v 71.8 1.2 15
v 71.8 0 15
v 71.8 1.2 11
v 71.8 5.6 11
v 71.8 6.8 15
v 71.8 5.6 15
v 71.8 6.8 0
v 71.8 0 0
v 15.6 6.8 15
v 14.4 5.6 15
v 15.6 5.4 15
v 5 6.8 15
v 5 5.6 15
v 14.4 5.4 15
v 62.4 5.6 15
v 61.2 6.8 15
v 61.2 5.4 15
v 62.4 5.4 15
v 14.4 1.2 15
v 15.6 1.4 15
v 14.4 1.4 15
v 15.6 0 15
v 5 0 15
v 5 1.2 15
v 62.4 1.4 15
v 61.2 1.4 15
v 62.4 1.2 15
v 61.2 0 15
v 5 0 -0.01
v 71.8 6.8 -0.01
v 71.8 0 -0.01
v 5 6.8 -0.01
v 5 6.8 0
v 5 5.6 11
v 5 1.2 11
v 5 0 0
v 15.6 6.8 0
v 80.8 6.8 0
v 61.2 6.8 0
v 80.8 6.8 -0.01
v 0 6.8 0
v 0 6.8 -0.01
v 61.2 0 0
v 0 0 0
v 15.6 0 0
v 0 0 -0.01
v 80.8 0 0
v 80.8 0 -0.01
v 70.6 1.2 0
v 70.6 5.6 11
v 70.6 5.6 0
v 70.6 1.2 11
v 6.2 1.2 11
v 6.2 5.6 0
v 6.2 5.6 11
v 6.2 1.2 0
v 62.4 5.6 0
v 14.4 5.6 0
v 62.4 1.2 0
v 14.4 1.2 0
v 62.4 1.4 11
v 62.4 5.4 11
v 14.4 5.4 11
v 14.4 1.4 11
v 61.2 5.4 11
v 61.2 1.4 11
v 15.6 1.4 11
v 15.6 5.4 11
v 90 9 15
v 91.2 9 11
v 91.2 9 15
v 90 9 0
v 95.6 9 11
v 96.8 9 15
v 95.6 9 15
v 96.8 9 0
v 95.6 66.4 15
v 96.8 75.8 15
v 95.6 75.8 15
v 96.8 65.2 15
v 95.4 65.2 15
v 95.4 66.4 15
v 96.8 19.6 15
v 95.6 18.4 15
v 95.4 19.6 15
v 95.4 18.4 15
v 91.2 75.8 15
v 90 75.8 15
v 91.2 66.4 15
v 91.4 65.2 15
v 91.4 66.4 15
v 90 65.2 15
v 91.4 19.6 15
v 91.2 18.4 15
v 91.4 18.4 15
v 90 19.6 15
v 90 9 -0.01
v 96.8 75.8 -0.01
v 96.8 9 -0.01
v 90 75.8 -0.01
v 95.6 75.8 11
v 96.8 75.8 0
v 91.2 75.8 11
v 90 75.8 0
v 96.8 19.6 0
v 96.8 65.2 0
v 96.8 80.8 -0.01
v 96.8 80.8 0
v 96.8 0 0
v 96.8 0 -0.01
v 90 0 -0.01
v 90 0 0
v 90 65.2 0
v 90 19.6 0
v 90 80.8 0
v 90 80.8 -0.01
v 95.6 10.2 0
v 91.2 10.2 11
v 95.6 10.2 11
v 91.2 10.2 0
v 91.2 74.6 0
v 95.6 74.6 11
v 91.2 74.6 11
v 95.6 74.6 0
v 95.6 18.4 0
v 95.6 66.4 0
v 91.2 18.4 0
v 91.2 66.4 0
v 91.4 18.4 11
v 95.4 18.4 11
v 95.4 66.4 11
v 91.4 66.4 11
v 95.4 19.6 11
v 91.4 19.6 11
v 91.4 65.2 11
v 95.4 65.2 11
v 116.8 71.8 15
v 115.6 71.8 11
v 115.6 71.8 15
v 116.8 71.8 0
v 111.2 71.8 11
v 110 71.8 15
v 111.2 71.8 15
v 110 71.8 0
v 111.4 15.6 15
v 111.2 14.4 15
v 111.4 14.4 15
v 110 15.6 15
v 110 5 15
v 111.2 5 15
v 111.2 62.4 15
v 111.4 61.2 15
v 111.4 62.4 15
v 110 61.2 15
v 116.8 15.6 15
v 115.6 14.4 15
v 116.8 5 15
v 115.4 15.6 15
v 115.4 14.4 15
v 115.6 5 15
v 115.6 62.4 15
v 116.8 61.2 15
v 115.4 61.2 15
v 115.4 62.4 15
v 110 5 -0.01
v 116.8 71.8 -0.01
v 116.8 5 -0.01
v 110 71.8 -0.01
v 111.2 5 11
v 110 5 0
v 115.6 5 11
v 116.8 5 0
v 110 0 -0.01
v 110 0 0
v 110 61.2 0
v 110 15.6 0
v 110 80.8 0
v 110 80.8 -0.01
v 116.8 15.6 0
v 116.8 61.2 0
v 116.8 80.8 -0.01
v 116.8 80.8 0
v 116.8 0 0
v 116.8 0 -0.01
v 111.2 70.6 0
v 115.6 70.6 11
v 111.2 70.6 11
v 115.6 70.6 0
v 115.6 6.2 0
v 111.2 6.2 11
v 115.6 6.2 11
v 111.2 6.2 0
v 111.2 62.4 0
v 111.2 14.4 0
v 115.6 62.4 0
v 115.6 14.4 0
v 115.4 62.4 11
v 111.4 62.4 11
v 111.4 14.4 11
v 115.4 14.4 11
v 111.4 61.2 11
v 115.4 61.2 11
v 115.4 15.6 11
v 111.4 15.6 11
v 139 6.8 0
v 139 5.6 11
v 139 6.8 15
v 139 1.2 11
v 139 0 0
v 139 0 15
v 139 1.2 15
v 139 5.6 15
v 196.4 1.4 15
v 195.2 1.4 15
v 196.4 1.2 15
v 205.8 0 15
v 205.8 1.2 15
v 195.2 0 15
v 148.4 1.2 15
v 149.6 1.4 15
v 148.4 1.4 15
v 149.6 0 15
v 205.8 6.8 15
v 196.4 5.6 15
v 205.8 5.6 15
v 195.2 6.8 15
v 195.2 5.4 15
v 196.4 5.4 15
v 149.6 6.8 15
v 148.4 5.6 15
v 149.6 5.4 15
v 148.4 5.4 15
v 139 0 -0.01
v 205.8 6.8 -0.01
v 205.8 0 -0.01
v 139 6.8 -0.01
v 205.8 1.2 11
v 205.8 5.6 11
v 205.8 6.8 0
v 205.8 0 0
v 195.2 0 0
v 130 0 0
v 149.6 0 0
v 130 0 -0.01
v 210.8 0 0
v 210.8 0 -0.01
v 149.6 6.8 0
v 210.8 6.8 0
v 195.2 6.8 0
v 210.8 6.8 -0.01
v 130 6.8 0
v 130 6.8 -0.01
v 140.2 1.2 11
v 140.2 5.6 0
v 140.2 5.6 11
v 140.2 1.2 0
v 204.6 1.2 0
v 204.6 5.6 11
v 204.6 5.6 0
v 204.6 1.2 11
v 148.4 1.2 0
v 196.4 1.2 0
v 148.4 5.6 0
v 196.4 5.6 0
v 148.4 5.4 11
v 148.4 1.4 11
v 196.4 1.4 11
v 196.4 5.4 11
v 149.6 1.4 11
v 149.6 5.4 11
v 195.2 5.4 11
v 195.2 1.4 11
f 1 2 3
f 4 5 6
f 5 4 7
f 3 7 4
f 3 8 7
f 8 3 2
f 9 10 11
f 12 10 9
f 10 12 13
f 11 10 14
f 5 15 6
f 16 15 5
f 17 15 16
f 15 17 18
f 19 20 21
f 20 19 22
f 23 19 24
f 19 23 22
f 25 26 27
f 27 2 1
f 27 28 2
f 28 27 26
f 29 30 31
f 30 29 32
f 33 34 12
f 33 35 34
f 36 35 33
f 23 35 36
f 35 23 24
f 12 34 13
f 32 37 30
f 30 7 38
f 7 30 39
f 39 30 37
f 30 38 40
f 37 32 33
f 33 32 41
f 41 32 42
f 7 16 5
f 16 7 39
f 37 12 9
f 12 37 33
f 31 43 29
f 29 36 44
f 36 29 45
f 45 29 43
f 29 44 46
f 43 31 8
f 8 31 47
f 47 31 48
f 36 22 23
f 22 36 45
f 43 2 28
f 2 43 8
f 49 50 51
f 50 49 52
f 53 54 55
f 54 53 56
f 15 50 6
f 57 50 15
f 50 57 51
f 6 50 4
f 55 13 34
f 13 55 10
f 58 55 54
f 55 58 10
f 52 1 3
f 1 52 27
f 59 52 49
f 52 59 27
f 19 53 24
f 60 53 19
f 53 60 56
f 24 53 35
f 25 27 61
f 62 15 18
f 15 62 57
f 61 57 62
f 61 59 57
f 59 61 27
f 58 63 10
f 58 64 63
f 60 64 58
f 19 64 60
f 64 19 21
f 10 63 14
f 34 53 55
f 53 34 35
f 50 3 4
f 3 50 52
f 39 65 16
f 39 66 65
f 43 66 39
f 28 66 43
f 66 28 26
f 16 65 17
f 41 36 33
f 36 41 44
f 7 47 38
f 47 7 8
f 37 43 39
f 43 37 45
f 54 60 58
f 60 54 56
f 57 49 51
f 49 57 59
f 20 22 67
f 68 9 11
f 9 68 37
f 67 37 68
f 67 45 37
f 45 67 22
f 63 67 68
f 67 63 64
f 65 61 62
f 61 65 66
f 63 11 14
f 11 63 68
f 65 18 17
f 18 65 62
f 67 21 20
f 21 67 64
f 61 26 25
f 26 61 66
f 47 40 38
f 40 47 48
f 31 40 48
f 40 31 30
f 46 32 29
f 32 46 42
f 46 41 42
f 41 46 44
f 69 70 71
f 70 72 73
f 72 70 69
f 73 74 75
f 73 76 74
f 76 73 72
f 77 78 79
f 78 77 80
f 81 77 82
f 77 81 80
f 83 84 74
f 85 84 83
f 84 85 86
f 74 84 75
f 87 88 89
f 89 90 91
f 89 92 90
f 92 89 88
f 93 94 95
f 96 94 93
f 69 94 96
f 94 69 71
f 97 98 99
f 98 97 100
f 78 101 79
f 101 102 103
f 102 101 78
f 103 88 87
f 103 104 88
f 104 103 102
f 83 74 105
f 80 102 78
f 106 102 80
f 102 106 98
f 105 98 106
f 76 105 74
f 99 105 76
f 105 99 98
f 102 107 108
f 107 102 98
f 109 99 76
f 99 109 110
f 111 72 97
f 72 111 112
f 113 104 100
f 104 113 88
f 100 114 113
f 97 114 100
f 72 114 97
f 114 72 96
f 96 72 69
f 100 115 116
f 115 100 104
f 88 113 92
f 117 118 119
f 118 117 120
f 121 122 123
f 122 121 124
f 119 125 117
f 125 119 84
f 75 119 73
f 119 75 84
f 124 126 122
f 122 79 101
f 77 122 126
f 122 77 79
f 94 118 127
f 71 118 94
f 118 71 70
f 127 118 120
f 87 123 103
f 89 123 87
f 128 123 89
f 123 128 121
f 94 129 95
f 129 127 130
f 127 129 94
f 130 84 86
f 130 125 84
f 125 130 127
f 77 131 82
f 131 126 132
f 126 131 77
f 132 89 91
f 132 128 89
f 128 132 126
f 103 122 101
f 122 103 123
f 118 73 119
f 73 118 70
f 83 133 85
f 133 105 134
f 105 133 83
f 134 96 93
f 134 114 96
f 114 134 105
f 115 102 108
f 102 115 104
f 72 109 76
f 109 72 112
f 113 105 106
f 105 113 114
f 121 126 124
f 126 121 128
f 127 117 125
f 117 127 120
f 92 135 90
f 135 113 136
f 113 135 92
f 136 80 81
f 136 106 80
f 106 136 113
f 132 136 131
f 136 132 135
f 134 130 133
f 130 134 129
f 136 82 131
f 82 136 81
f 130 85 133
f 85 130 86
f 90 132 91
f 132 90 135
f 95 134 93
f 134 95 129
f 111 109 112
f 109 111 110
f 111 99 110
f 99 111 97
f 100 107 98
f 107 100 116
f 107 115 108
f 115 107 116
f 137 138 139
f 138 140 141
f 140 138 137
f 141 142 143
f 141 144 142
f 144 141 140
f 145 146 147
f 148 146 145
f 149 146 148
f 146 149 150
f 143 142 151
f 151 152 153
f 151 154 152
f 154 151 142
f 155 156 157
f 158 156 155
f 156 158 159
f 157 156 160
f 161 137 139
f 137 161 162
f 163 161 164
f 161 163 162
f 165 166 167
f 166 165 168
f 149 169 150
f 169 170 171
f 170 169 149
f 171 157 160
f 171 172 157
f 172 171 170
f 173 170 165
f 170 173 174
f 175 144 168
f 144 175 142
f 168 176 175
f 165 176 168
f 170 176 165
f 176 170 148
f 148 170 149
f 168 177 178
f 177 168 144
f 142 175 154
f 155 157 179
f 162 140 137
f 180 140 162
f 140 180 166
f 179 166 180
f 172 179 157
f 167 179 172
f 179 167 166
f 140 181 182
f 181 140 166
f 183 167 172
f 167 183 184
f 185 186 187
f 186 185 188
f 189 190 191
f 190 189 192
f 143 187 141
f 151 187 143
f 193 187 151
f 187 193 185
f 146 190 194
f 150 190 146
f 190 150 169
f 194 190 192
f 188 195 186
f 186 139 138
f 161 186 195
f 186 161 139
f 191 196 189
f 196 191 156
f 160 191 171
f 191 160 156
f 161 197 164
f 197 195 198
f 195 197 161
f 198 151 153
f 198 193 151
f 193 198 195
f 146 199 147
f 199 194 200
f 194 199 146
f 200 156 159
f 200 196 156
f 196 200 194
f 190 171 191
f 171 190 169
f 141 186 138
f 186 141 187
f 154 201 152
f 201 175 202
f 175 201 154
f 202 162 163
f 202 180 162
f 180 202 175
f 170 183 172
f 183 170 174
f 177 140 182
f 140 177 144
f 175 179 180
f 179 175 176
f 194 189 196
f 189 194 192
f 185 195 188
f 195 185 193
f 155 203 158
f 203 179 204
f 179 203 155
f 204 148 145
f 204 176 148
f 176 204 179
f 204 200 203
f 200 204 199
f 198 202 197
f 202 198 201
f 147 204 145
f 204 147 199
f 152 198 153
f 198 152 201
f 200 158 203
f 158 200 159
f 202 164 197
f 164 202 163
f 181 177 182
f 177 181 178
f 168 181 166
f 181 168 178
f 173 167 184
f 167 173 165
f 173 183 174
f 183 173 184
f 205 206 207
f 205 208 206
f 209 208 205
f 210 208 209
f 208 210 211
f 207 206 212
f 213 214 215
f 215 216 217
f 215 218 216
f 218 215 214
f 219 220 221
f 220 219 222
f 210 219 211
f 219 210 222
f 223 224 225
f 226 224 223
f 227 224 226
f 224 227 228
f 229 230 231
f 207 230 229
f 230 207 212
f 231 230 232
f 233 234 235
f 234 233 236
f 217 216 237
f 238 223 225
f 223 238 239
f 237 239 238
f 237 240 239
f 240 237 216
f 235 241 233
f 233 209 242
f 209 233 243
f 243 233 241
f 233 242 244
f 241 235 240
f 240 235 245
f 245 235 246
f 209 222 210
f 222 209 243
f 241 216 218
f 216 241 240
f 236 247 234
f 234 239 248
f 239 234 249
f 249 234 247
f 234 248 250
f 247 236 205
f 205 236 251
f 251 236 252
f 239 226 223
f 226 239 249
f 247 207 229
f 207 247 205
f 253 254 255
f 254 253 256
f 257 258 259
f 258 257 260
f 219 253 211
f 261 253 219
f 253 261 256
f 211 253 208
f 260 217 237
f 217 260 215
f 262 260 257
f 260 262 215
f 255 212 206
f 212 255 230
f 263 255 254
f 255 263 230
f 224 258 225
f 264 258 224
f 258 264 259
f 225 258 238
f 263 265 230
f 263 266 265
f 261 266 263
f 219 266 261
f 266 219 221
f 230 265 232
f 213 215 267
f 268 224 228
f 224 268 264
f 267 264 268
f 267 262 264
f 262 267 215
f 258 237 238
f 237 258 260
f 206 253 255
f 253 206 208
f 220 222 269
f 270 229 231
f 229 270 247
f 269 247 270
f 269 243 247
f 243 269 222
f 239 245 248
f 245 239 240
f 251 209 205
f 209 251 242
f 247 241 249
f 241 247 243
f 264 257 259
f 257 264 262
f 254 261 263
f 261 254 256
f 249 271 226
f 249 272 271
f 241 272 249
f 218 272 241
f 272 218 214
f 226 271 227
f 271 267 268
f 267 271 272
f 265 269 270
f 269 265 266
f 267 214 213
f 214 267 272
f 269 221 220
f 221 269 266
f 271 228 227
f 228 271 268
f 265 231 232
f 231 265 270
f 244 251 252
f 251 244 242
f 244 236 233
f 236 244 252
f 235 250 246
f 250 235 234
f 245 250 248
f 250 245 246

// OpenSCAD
// file: ../../Base/Boxes.scad
// Fischertechnik Box Foundation
// Pre-designed Boxes

use <Constants.scad>

include <PlacementOptions.scad>

box190Width = 190;
box190Depth = 130;
box130Width = 130;
box130Depth = 95;
boxUsageHeight = 33.9;
boxWallThickness = 2.4;
boxBaseThickness = 1.0;
boxWebWidth = 3.0;

// getBoxWallThickness()
// Gets the wall thickness of a Fischertechnik Box

function getBoxWallThickness() = boxWallThickness;

// Gets the usable height of a fischertechnik box
function getBoxUsageHeight() = boxUsageHeight;

// Gets the thickness of the Fischertechnik box base.
function getBoxBaseThickness() = boxBaseThickness;

// Gets the width of a box web
function getBoxWebWidth() = boxWebWidth;

// Gets the usable inner space of a Box 190 as an x/y-list
function getBox190Space() = [
    box190Width - 2*getBoxWallThickness(), 
    box190Depth - 2*getBoxWallThickness() ];

// Imports the Fischertechnik empty box 130x190 mm and places it at position 0,0
// 190x130 are the outer sizes, the inner space is slightly smaller. Use getBox190Space() to get the inner sizes.
// This module needs the STL file "Fischertechnik Box 130x190.stl" in the library path.
// The box is positioned that the usable inner space is at the 0,0,0 position. The

module Box190() {
    translate([-getBoxWallThickness(),-getBoxWallThickness(),-getBoxBaseThickness()])
        import("Fischertechnik Box 130x190.stl", convexity=3);
}

// Gets the usable inner space of a Box 130 as an x/y-list
function getBox130Space() = [
    box130Width - 2*getBoxWallThickness(), 
    box130Depth - 2*getBoxWallThickness() ];

// Imports the Fischertechnik empty box 95x130 mm and places it at position 0,0
// 190x130 are the outer sizes, the inner space is slightly smaller. Use getBox190Space() to get the inner sizes.
// This module needs the STL file "Fischertechnik Box 95x130.stl" in the library path.
// The box is positioned that the usable inner space is at the 0,0,0 position. The

module Box130() {
    translate([-getBoxWallThickness(),-getBoxWallThickness(),-getBoxBaseThickness()])
        import("Fischertechnik Box 95x130.stl", convexity=3);
}

// Creates a web at the specified box walls
// corner 0 = LowerLeft, 1 = UpperLeft, 2 = UpperRight, 3 = LowerRight
// side 0 = LeftOfCorner, 1 = RightOfCorner
// distance = Distance in mm from the corner
// box = inner width and depth of the box (default: Box 190)
// webWidth = length of the web (default is 3 mms)
// webThickness = thickness of the web (default is 1 mm)

module BoxWeb(corner, side, distance, box=getBox190Space(), webWidth=getBoxWebWidth(), webThickness=1.0) {
    sink = getBoxWallThickness()/2;

    width = (corner % 2 == 0) ? 
            (side == LeftOfCorner ? webWidth : webThickness) :
            (side == LeftOfCorner ? webThickness : webWidth);

    depth = (corner % 2 == 0) ? 
            (side == RightOfCorner ? webWidth : webThickness) :
            (side == RightOfCorner ? webThickness : webWidth);
    
    xDiff = corner == LowerLeft ? 
                (side == LeftOfCorner ? -sink : distance) :
            (corner == UpperLeft ?                
                (side == LeftOfCorner ? distance : -sink) :
            (corner == UpperRight ?
                (side == LeftOfCorner ? box.x-webWidth+sink : box.x-distance-webThickness) :
                (side == LeftOfCorner ? box.x-distance-webThickness: box.x-webWidth+sink)));

    yDiff = corner == LowerLeft ? 
                (side == RightOfCorner ? -sink : distance) :
            (corner == UpperLeft ?
                (side == RightOfCorner ? box.y-distance : box.y-webWidth+sink) :
            (corner == UpperRight ?
                (side == RightOfCorner ? box.y-webWidth+sink : box.y-distance) :
                (side == RightOfCorner ? distance : -sink)));
    
    translate([xDiff, yDiff, -getExcess()])
        cube([width, depth, boxUsageHeight + 2*getExcess()]);
}
// file: ../../Base/Rotation.scad
// Fischertechnik Box Foundation
// Geometry Helpers Rotation

include <PlacementOptions.scad>

// getRotatedSpace(space, rotation=NoRotation)
// Rotates the space dependent on the specified rotation

function getRotatedSpace(space, rotation=NoRotation) = [
    (rotation == Rotate90 || rotation == Rotate270) ? space.y : space.x,
    (rotation == Rotate90 || rotation == Rotate270) ? space.x : space.y
];

// Rotates the given space around the fixed left lower corner
// space = the space the children needs as width/depth list [width,depth]
// rotation = 0 Rotate0 degrees, 1 Rotate90 degrees, 2 Rotate180 degrees, 3 Rotate270 degrees (equivalent to -90)

module RotateFix(space, rotation=NoRotation) {
    dy = (rotation == Rotate0 || rotation == Rotate270) ? 0 :
        (rotation == Rotate90) ? space.x :
        space.y;
    dx = (rotation < Rotate180) ? 0 :
        (rotation == Rotate180) ? space.x :
        space.y;
    
    translate([dx, dy, 0])
        rotate([0, 0, rotations[rotation]])
            children();
}
// file: ../../Base/Alignment.scad
// Fischertechnik Box Foundation
// Geometry Helpers Alignment

include <PlacementOptions.scad>

// getAlignedX(elementWidth, spaceWidth, align=AlignRight, offset=0)
// Gets the aligned X offset of an element with the given
// width in the given space.
// elementWidth = The width of the element to positon
// spaceWidth = The space where the element should be aligned
// align = 0 AlignLeft, 1 AlignCenter, 2 AlignRight
// offset = an optional offset from the aligned position. When
// aligned left or centered, then positive values are in X direction.
// When aligned right then positive values are in negative X direction.

function getAlignedX(elementWidth, spaceWidth, align=AlignRight, offset=0) =
    (align == AlignLeft) ?
        offset :
        ((align == AlignCenter) ?
        (spaceWidth - elementWidth)/2 + offset :
        spaceWidth - offset - elementWidth);

// getAlignedY(elementDepth, spaceDepth, align=AlignTop, offset=0)
// Gets the aligned Y offset of an element with the given
// depth in the given space.
// elementDepth = The depth of the element to positon
// spaceDepth = The space where the element should be aligned
// align = 0 AlignBottom, 1 AlignCenter, 2 AlignTop
// offset = an optional offset from the aligned position. When
// aligned bottom or centered, then positive values are in Y direction.
// When aligned top then positive values are in negative Y direction.

function getAlignedY(elementDepth, spaceDepth, align=AlignTop, offset=0) =
    (align == AlignBottom) ?
        offset :
        ((align == AlignCenter) ?
        (spaceDepth - elementDepth)/2 + offset :
        spaceDepth - offset - elementDepth);
// file: ../../Base/Constants.scad
// Fischertechnik Box Foundation
// Constants

// Constant values necessary for multiple elements

// Base constants
dividerThickness = 1.2;
excess = 0.01;
fragments = 90;
tolerance = 0.8;

// Gets the thickness of a divider 
function getDividerThickness() = dividerThickness;

// Gets the excess that is used to merge walls into each other
function getExcess() = excess;

// Gets amount of fragments of a cylinder
function getFragments() = fragments;

// Gets the inner tolerance of a frame to each side
function getTolerance() = tolerance;


// Fischertechnik specific constants
axisDiameter = 4;
axisBottomDiameter = axisDiameter + 1;
axisTolerance = 0.2;
axisLockingLength = 8;

// Gets axis diameter of Fischertechnik axis
function getAxisDiameter() = axisDiameter;

// Gets axis diameter tolerance (subtracted for element axis)
function getAxisTolerance() = axisTolerance;

// Gets the axis diameter for standing axis
function getStandAxisDiameter() = getAxisDiameter() - getAxisTolerance();

// Gets axis bottom diameter for thicker part at the bottom
function getAxisBottomDiameter() = axisBottomDiameter;

// Gets the lengthh of the locking part of a locking axis
function getAxisLockingLength() = axisLockingLength;

// Studs

studHeight = 2.5;
studTolerance = 0.2;
studRailDistance = 9;   // as in ft 50

// gets the height of a connecting stud
function getStudHeight() = studHeight;

// gets the connecting stud height tolerance
function getStudTolerance() = studTolerance;

// gets the default rail distance for studs
function getStudRailDistance() = studRailDistance;

// Dockable Frame with Edge

standardEdgeDistance = 2.5;
standardWebDistance = 11.5;
standardCornerLength = 15;

// gets the standard distance to the wall of the box for dockable frames with webs
function getStandardEdgeDistance() = standardEdgeDistance;

// gets the standard distance of each web to the corner of the dockable frame
function getStandardWebDistance() = standardWebDistance;

// gets the standard length of the corner walls of a dockable frame
function getStandardCornerLength() = standardCornerLength;

// Tubes

tubeWallFactor = 0.8;

// gets the wall thickness of a tube.
function getTubeWallThickness() = tubeWallFactor * getDividerThickness();

// Small Parts and Divider Frame

smallPartsFrameHeight = 20;

// gets the frame height for docked small parts boxes.
function getSmallPartsFrameHeight() = smallPartsFrameHeight;

// Hubs

hubRingDiameter = 19.5;
hubRingLevelDiameter = 21;

// gets the diameter of a tube matching the inner ring of a wheel
function getHubRingDiameter() = hubRingDiameter;

// gets the diameter of a hub tube with a thicker diameter
function getHubRingLevelDiameter() = hubRingLevelDiameter;

// Struts

strutAddLength = 9.0;
strutDepth = 8.0;
strutThickness = 2.8;
strutOuterTolerance = 0.6;

// gets the full length of a strut (nominal length plus 2x radius at the ends)
function getFullStrutLength(length) = length + strutAddLength;

// gets the radius of the end of a strut
function getStrutEndRadius() = strutAddLength / 2;

// gets the the depth (width) of a strut
function getStrutDepth() = strutDepth;

// gets the the thickness of a strut
function getStrutThickness() = strutThickness;

// gets the tolerance added to the strut sizes for strut holders
function getStrutOuterTolerance() = strutOuterTolerance;

// Propeller

propellerAxisDiameter = 7.0;
propellerAxisTolerance = 0.2;

// gets the propeller axis outer diameter
function getPropellerAxisDiameter() = propellerAxisDiameter;

// gets the propeller axis printing tolerance
function getPropellerAxisTolerance() = propellerAxisTolerance;
// file: ../../Base/PlacementOptions.scad
// Fischertechnik Box Foundation
// Placement Options

// Alignment
NoAlign = 0;
AlignLeft = 1;
AlignBottom = 2;
AlignCenter = 3;
AlignRight = 4;
AlignTop = 5;

// Element rotation degree steps
rotations = [0, -90, -180, -270];

// Rotation
NoRotation = 0;
Rotate0 = 0;
Rotate90 = 1;
Rotate180 = 2;
Rotate270 = 3;

// Docking (seen from above)
NoDock = -1;
DockLeft = 0;
DockTop = 1;
DockRight = 2;
DockCorner = 2;
DockBottom = 3;

// Web corners
LowerLeft = 0;
UpperLeft = 1;
UpperRight = 2;
LowerRight = 3;

// Web position relative to corner
LeftOfCorner = 0;
RightOfCorner = 1;
// file: ../../Elements/FrameBracketWithAxle80.scad
// Fischertechnik Box Library
// Frame for bracket with axle 80
// 38201

use <../Base/Constants.scad>
use <../ModelBase/Simple.scad>
use <../ModelBase/Complex.scad>

length = 66;
axisLength = 80;

completeSpace = [
    axisLength + getTolerance(), 
    getFrameAxisSpace(length).y,
    getFrameAxisHeight()];

// getFrameBracketWithAxle80Space()
// Gets the width (.x) and depth (.y) of the axis frame.

function getFrameBracketWithAxle80Space() = completeSpace;

// FrameBracketWithAxle80()
// Axis holder for a single 60 mm axis.

module FrameBracketWithAxle80() {
    Space(completeSpace);
    translate([5, 0])
        FrameAxis(length, true);
}

// Test
color("lightgray")
FrameBracketWithAxle80();
// file: ../../Base/Placement.scad
// Fischertechnik Box Foundation
// Geometry Helpers Placement

use <Constants.scad>
use <Alignment.scad>
use <Rotation.scad>
use <Boxes.scad>

include <PlacementOptions.scad>

// Place(x=0, y=0, elementSpace=[0,0], alignX=AlignLeft, alignY=AlignBottom, rotation=Rotate0, boxSpace=getBox190Space())
// Places the child at the specified position
// y = Y-Position. This is a relative position when an X aligment is specified.
// x = X-Position. This is a relative position when an Y aligment is specified.
// elementSpace = space of the element to be placed [x,y]
// alignX = -1=NoAlign, 0 AlignLeft, 1 AlignCenter, 3 AlignRight (elementSpace and boxSpace required!)
// alignY = -1=NoAlign, 2 AlignBottom, 1 AlignCenter, 4 AlignTop (elementSpace and boxSpace required!)
// rotation = 0 Rotate0 0 degrees, 1 Rotate90 90 degrees, 
// 2 Rotate180 180 degrees, 3 Rotate270 270 degrees (equivalent to -90)
// boxSpace = Inner space of the box where the placement occurs [x,y] - default is Box 190x130 inner space

module Place(x=0, y=0, elementSpace=[0,0], 
  alignX=AlignLeft, alignY=AlignBottom, 
  rotation=NoRotation, boxSpace=getBox190Space()) {

    module Position(x, y, space, rotation=Rotate0) {
        translate([x, y, 0])
            RotateFix(space, rotation)
                children();
    }

    space = getRotatedSpace(elementSpace, rotation);
    alignedX = getAlignedX(space.x, boxSpace.x, alignX, x);
    alignedY = getAlignedY(space.y, boxSpace.y, alignY, y);
    Position(alignedX, alignedY, elementSpace, rotation)
        children();
}

// Center(space=getBox130Space(), elementSpace=[0,0])
// space = Space where the children is centered. For cylinder use centered=true and no elementSpace.
// elementSpace = space of the element to be centered [x,y]

module Center(space=getBox190Space(), elementSpace=[0,0]) {
    translate([(space.x - elementSpace.x) / 2, (space.y - elementSpace.y) / 2])
        children(0);
}

// CenterHorizontal(width=0, y=0, offset=0, space=getBox130Space())
// space = Space where the children is centered. For cylinder use centered=true and no elementSpace.
// elementSpace = space of the element to be centered [x,y]

module CenterHorizontal(width=0, y=0, offset=0, space=getBox190Space()) {
    translate([(space.x - width) / 2 + offset, y])
        children(0);
}

// CenterVertical(depth=0, x=0, offset=0, space=getBox130Space())
// space = Space where the children is centered. For cylinder use centered=true and no elementSpace.
// elementSpace = space of the element to be centered [x,y]

module CenterVertical(depth=0, x=0, offset=0, space=getBox190Space()) {
    translate([x, (space.y - depth) / 2 + offset])
        children(0);
}
// main file
// Fischertechnik Box Foundation
// Elements
// Test FrameBracketWithAxle80

use <../../Base/Placement.scad>
use <../../Elements/FrameBracketWithAxle80.scad>

include <../../Base/PlacementOptions.scad>

FrameBracketWithAxle80();

Place(90, 0, getFrameBracketWithAxle80Space(), rotation=Rotate90)
    FrameBracketWithAxle80();

Place(110, 0, getFrameBracketWithAxle80Space(), rotation=Rotate270)
    FrameBracketWithAxle80();

Place(130, 0, getFrameBracketWithAxle80Space(), rotation=Rotate180)
    FrameBracketWithAxle80();
